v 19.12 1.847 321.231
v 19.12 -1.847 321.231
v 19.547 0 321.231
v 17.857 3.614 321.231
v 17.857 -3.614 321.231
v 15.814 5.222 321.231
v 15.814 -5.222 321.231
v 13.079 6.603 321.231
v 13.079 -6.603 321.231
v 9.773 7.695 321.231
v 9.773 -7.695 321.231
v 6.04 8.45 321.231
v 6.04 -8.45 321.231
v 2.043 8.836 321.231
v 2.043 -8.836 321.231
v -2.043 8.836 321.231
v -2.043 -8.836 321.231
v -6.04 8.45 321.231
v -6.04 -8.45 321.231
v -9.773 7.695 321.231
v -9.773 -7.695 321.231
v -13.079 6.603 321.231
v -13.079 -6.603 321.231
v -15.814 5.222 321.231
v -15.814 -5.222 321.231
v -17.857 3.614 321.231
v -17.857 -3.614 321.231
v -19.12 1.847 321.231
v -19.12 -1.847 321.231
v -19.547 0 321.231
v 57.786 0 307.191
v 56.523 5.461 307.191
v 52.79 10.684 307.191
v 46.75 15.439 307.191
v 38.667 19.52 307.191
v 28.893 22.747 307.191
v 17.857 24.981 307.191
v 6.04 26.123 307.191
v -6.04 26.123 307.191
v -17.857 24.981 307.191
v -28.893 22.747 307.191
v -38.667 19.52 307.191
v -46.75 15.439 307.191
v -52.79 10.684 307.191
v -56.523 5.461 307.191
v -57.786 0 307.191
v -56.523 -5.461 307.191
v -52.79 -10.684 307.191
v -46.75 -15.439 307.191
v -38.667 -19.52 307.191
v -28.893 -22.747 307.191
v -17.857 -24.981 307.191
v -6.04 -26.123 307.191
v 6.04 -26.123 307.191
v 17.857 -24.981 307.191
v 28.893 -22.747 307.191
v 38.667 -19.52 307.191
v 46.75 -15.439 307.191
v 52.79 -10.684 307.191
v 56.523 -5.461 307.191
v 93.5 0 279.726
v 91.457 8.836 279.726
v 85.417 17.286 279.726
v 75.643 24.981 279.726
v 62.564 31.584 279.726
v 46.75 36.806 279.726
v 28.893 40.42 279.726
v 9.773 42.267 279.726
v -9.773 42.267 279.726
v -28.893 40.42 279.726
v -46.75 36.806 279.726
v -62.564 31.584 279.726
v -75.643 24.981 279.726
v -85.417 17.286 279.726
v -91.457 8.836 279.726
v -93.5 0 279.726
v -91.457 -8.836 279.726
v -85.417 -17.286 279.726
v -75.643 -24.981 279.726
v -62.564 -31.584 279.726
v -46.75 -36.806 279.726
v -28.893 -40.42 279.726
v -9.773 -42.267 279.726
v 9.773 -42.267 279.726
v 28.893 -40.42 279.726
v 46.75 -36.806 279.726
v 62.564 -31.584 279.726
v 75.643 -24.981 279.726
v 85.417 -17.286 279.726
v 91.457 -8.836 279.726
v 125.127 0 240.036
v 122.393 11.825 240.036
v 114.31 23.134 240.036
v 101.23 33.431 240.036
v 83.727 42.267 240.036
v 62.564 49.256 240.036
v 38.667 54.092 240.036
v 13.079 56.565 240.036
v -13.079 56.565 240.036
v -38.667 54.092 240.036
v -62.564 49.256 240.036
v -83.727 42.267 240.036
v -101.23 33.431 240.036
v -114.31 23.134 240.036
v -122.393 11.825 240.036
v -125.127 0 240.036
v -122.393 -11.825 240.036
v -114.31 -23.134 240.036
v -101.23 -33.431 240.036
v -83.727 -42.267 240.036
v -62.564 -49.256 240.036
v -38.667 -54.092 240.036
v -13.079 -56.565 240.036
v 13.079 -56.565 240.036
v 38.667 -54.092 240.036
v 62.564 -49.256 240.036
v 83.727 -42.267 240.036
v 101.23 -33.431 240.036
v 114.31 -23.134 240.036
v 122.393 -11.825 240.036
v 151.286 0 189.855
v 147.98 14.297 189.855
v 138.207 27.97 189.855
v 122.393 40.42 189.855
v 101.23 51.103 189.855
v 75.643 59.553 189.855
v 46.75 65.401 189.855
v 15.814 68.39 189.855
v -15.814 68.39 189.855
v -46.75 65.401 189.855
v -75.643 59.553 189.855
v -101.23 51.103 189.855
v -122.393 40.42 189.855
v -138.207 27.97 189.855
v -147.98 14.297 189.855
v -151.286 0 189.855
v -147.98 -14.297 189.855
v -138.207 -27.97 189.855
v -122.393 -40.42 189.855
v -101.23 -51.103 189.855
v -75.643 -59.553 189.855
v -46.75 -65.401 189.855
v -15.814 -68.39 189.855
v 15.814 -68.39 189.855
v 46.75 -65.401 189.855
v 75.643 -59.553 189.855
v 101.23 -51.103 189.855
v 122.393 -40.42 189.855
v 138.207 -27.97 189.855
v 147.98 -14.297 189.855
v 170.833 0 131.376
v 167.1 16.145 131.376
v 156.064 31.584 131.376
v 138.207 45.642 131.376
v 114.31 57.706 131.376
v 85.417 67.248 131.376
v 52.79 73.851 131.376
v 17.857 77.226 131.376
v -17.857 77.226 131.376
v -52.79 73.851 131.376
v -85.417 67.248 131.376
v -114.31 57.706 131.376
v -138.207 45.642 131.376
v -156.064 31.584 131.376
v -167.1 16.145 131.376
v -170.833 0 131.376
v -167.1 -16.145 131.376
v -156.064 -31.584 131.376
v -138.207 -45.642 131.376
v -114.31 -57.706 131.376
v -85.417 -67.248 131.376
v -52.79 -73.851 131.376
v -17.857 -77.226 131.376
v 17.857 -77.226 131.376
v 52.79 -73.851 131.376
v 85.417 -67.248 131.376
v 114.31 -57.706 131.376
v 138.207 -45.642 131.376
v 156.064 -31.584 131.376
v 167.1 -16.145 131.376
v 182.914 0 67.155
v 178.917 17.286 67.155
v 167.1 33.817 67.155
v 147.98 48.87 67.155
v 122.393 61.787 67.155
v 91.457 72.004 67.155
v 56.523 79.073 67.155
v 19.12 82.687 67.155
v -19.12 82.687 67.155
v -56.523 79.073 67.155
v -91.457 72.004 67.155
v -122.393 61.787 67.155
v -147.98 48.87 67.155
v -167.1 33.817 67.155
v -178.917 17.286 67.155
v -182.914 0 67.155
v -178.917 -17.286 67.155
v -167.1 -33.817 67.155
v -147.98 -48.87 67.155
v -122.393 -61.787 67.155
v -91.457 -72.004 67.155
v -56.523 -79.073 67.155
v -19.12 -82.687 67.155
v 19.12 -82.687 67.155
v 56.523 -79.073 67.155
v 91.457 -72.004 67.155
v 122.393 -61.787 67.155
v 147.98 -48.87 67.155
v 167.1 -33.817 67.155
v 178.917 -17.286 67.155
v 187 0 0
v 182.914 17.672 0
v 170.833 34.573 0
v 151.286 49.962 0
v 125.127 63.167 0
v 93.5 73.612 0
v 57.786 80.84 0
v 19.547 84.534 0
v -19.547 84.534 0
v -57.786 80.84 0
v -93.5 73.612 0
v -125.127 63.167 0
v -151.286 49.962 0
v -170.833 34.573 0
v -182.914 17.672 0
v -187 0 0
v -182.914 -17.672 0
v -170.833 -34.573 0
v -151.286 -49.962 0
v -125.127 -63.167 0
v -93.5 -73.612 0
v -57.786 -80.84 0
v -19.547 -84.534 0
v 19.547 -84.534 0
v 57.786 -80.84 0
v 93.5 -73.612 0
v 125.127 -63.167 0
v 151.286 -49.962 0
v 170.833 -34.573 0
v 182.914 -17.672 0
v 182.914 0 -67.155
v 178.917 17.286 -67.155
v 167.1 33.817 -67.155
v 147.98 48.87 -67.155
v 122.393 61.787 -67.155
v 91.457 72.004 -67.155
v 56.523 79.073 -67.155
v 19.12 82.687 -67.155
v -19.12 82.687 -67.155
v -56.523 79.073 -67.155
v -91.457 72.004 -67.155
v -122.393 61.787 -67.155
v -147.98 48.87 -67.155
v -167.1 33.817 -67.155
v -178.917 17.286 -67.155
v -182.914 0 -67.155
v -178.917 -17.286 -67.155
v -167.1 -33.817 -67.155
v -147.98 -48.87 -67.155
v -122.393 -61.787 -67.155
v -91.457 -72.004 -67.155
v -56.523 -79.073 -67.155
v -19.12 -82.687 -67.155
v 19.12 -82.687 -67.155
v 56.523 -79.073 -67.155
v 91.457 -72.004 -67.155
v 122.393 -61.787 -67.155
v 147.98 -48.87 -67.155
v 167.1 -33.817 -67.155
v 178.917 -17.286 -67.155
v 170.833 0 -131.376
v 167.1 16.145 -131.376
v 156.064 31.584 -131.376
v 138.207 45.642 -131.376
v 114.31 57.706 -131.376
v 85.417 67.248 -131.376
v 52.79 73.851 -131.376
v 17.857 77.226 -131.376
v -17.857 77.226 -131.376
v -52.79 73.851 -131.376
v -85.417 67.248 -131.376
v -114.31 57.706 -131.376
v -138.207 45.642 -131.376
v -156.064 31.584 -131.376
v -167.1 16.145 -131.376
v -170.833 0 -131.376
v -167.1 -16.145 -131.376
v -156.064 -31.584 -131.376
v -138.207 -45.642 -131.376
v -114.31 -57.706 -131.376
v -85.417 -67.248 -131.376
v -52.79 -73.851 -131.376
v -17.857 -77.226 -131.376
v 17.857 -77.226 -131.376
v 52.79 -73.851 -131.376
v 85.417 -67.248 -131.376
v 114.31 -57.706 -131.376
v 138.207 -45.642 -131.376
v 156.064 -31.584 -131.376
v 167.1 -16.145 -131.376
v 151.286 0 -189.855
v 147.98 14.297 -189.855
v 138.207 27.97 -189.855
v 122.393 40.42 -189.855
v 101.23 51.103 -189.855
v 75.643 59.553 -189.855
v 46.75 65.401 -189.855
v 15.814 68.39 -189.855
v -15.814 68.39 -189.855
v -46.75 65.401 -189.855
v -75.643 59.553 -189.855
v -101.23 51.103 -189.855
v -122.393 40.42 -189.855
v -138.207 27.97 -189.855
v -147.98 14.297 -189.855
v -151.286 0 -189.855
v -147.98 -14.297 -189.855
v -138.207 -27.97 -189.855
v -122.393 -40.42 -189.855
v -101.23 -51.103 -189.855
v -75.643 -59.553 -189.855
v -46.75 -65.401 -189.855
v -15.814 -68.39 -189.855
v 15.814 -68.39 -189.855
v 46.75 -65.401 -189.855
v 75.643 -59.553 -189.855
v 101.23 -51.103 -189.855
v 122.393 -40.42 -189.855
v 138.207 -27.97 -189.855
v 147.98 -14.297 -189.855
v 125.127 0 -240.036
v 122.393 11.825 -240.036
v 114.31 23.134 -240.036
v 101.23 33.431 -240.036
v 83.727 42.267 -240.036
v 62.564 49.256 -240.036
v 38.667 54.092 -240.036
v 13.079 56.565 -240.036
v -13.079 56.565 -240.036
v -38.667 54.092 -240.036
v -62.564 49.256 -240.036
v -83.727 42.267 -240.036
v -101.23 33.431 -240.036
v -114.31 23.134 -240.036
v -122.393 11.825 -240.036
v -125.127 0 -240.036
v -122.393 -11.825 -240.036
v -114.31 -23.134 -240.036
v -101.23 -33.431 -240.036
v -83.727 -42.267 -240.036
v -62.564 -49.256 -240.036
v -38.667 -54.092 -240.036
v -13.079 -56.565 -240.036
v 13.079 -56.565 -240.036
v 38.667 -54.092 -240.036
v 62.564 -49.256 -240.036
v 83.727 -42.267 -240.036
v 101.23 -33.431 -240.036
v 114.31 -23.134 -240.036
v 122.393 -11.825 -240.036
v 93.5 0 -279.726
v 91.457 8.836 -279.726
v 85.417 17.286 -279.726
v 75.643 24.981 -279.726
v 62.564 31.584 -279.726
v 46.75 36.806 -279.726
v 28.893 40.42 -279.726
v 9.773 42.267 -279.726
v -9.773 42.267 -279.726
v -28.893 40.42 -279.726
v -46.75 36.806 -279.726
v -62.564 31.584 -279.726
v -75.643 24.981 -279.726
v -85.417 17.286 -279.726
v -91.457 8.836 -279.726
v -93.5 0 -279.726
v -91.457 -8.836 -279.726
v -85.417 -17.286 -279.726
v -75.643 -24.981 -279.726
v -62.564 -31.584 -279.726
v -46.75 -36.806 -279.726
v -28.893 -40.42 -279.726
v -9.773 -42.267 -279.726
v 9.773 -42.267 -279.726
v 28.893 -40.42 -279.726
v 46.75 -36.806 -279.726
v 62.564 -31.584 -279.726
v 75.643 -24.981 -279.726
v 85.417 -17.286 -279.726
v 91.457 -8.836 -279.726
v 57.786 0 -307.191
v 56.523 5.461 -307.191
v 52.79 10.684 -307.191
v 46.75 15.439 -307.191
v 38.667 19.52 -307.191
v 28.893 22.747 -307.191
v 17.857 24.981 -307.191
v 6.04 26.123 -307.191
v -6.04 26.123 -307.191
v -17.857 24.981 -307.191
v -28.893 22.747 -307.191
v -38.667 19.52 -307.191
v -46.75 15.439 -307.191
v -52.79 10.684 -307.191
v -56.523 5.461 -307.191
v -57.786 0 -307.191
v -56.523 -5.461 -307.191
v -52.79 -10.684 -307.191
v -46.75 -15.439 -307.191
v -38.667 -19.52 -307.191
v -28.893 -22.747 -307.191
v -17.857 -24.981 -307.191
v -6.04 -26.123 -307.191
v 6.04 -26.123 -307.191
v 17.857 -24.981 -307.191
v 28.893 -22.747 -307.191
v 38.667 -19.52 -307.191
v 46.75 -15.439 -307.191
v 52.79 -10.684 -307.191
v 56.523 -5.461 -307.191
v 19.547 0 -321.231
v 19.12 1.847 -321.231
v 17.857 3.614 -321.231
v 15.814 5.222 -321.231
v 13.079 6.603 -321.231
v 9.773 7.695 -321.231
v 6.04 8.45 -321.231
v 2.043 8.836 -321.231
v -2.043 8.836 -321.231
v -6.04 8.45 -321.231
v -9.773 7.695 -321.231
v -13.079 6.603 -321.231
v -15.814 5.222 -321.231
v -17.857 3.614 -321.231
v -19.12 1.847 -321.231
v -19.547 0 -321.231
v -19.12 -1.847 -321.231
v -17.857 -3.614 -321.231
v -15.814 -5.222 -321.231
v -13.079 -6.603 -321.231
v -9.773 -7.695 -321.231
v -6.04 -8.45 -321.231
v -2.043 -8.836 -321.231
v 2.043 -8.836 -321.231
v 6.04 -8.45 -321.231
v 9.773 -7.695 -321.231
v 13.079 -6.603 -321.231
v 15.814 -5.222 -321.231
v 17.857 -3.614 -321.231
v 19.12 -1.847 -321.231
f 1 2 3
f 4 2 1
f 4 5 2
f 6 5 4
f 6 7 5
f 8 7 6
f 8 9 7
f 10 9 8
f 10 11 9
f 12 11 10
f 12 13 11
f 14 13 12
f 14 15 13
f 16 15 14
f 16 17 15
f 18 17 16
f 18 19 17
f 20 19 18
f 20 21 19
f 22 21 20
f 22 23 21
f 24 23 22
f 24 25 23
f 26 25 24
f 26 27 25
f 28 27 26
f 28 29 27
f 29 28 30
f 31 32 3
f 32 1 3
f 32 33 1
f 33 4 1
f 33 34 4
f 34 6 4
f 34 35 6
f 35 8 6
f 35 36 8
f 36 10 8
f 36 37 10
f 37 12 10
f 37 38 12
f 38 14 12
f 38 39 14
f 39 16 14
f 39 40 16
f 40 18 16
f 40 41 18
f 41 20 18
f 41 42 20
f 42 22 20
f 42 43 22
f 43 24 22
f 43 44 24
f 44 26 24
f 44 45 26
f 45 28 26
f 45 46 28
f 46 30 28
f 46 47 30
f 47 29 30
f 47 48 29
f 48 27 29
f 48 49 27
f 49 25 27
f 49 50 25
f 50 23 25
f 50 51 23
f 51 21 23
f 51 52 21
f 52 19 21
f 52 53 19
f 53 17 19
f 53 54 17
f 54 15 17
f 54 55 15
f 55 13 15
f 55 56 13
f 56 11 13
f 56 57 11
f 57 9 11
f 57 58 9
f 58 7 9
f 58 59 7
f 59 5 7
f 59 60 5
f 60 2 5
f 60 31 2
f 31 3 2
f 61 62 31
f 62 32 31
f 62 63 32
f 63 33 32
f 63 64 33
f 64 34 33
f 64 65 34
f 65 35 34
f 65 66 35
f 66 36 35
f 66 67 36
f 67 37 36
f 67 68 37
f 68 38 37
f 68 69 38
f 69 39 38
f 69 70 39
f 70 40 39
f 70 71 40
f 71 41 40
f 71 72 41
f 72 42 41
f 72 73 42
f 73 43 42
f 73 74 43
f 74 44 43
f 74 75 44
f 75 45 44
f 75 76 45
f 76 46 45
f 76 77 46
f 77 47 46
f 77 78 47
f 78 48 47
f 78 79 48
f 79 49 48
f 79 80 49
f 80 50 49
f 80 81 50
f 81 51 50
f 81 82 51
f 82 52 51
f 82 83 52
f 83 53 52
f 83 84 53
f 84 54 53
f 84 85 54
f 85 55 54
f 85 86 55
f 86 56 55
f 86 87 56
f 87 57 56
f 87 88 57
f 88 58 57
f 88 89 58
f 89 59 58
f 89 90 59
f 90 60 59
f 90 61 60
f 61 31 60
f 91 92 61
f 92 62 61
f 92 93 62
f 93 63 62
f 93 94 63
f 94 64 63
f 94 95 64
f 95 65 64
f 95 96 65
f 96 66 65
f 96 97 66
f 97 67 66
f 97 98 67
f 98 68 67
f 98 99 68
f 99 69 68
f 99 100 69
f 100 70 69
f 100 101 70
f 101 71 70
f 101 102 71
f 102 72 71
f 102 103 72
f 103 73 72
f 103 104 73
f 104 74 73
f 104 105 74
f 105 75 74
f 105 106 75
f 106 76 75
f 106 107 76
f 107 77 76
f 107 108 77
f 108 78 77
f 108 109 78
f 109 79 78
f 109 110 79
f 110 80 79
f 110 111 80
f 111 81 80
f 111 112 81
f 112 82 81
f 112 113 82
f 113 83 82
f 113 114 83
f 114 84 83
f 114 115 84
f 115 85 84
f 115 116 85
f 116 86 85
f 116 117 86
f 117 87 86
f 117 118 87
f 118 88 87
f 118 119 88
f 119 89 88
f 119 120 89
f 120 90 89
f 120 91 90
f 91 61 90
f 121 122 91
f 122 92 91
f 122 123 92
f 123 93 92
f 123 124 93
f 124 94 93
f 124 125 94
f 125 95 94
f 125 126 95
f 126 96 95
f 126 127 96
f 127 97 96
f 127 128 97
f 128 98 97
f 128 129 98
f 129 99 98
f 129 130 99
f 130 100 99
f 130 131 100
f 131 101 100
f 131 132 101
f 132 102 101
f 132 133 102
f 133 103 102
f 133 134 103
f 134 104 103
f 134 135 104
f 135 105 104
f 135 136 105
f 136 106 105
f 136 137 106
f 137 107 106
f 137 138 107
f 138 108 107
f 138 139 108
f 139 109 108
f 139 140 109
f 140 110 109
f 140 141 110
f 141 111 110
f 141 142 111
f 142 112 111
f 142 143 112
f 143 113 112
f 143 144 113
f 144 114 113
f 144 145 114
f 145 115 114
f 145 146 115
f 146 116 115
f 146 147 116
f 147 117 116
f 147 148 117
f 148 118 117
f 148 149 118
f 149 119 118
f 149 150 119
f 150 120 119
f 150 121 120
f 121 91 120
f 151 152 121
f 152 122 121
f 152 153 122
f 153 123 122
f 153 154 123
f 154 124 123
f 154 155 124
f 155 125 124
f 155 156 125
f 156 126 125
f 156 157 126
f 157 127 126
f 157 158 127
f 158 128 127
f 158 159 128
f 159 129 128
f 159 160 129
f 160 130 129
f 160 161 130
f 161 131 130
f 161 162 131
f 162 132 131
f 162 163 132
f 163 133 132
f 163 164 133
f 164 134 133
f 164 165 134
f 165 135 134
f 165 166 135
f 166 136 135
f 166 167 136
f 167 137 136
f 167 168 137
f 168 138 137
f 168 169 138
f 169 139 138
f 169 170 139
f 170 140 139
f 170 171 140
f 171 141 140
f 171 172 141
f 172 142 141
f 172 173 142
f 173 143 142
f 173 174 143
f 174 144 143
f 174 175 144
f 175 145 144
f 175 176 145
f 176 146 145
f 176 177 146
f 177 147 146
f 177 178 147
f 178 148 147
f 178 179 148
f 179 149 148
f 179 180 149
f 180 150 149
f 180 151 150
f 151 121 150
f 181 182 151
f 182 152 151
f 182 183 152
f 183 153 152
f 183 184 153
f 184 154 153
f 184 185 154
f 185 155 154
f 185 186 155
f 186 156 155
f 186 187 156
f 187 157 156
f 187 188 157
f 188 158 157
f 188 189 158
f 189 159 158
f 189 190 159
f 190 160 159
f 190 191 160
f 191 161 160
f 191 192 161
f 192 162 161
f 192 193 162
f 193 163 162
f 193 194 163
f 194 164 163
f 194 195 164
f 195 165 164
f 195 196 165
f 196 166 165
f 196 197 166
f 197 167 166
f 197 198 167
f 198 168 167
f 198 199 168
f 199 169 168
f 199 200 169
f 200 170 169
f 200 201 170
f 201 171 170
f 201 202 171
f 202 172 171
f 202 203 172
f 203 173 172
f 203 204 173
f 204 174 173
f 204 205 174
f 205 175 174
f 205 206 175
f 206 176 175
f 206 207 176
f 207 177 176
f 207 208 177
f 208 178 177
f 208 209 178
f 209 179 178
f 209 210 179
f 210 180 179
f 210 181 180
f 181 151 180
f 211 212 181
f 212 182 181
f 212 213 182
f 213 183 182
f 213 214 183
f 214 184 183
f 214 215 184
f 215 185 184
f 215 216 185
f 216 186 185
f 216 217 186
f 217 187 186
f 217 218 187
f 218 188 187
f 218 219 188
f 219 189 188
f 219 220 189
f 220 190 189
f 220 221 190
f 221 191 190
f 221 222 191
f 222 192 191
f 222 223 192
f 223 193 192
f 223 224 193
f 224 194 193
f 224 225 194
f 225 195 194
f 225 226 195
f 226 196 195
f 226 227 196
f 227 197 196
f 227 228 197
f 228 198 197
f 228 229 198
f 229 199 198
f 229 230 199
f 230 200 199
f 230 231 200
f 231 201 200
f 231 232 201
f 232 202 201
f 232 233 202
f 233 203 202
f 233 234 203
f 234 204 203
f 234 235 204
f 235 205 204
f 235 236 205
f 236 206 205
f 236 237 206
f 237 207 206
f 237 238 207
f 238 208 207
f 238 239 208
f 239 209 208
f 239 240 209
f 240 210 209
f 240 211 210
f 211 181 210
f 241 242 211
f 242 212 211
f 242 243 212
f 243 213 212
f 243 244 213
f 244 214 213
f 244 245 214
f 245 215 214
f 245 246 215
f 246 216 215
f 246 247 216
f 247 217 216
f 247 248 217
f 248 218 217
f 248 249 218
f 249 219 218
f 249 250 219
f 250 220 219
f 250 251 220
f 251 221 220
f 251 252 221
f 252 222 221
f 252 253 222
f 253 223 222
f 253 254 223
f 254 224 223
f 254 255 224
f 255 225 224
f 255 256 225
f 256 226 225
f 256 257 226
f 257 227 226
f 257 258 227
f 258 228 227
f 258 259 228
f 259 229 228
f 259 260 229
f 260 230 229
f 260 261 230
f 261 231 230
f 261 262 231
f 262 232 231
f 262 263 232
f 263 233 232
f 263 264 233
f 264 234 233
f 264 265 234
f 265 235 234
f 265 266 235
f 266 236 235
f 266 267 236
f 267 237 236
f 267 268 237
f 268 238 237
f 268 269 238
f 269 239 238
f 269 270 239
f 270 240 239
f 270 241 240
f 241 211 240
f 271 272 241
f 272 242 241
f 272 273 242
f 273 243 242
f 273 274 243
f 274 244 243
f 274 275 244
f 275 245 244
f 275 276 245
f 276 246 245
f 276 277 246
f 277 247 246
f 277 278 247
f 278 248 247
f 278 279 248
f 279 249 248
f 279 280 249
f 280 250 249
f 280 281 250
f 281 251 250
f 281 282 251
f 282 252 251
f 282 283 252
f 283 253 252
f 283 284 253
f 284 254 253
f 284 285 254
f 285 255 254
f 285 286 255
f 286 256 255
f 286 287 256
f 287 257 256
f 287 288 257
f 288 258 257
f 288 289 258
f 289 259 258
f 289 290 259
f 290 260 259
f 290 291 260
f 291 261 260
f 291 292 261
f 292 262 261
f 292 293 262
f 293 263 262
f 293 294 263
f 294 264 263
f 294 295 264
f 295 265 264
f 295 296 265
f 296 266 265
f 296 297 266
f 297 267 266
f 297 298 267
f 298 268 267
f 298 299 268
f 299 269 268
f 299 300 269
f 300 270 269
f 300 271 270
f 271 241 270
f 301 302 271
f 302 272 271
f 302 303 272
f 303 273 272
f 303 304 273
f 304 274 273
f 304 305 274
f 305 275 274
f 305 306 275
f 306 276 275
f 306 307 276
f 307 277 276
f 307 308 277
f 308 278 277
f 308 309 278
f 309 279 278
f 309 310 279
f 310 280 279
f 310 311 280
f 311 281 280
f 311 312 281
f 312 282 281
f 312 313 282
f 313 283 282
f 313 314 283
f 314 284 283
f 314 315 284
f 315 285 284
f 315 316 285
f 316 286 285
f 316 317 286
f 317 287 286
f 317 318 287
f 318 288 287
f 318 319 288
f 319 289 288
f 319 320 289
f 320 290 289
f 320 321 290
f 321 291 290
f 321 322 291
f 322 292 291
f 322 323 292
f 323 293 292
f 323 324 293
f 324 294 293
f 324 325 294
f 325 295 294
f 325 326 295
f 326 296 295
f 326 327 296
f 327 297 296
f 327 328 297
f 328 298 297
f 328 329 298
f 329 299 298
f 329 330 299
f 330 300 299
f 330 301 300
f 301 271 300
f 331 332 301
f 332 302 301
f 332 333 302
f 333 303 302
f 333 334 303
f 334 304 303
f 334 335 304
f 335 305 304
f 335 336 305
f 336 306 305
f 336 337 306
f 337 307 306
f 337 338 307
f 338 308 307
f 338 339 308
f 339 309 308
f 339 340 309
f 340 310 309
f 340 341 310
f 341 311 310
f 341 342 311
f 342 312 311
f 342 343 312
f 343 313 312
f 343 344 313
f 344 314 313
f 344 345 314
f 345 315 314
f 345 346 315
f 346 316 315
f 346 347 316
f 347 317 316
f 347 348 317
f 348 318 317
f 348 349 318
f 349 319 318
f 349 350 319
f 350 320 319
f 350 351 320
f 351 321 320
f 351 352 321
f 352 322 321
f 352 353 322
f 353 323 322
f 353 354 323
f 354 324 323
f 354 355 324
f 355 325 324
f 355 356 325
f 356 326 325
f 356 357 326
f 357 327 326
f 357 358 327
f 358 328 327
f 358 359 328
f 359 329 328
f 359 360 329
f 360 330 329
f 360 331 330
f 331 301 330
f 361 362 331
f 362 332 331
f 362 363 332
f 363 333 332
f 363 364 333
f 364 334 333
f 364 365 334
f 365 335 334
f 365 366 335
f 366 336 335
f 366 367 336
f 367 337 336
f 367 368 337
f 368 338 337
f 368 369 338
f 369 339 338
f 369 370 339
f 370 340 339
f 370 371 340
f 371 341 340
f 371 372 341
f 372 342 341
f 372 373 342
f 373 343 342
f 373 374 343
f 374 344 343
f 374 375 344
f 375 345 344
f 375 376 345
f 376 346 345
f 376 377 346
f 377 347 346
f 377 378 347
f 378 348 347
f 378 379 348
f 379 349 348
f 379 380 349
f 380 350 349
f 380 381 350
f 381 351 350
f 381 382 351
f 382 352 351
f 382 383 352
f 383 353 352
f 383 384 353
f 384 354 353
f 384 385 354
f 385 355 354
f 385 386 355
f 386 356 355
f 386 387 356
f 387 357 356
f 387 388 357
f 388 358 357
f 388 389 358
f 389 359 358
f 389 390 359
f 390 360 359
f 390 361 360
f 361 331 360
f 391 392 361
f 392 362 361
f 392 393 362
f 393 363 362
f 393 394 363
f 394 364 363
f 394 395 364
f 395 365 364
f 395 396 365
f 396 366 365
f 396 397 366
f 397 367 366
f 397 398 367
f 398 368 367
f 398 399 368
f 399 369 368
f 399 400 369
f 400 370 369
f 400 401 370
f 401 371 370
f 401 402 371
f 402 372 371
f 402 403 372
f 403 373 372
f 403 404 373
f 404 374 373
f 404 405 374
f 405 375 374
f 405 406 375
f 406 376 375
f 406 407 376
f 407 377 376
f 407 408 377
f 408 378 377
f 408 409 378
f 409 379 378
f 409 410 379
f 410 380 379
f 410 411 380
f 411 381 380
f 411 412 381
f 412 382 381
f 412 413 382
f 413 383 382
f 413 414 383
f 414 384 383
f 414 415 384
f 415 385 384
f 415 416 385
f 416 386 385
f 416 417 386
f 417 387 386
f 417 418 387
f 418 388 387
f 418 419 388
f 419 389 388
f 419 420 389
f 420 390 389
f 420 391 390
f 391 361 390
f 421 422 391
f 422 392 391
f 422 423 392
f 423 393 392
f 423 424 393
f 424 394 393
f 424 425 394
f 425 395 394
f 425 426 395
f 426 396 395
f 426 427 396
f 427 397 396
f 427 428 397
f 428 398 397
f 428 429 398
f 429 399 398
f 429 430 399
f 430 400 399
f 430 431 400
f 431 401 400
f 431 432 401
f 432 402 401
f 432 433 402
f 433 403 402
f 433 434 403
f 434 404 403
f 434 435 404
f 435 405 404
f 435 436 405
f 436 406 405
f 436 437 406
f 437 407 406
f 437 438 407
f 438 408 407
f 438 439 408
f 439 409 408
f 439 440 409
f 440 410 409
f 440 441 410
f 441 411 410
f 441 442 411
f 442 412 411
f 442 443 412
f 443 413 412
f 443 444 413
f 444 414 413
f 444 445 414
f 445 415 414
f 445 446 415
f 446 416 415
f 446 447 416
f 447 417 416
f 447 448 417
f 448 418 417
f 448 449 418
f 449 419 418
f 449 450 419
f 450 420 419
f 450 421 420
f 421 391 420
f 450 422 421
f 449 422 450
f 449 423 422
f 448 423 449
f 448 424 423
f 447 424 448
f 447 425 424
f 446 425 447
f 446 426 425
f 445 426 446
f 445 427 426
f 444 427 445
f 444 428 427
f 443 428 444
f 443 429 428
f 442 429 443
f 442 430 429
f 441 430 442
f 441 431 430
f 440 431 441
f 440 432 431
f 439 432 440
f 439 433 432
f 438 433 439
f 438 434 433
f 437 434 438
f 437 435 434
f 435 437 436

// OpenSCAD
// Generated by SolidPython 1.0.1 on 2020-07-29 00:46:49


scale(v = [11, 5, 19]) {
	sphere(r = 17);
}
/***********************************************
*********      SolidPython code:      **********
************************************************
 
# import packages: SolidPython
from solid import *
from solid.utils import *
from itertools import chain, combinations, permutations


class Resize:

    def __init__(self, scad_file):
        self.scad_file = scad_file
        #self.scad_file = import_scad(scad_file)
        # cone/cylinder param:
        self.r1 = 0
        self.r2 = 0
        self.h = 0
        # rectangular prism param:
        self.w = 0
        self.l = 0
        # ellipse param:
        self.r = 0

    # import OpenScad code (file name corresponds to shape)


    # classify shape + parameters
    def assign(self, param1, param2, param3):
        if self.scad_file == 'cone.scad':
            self.r1 = param1
            self.r2 = param2
            self.h = param3
        elif self.scad_file == 'cylinder.scad':
            self.r1 = param1
            self.r2 = param2
            self.h = param3
        elif self.scad_file == 'rectangularPrism.scad':
            self.h = param1
            self.l = param2
            self.w = param3
        else:
            self.r = param1
            self.h = param2

    # resize parameters
    def iterate(self):
        x = range(3, 20, 2)
        i = 1
        if self.scad_file == 'cone.scad':
            tempList = list(permutations(x, 2))
            for temp in tempList:
                param1 = temp[0]
                param2 = temp[1]
                filepath = 'produced_scad_files/' + 'cone' + str(param1) + '_' + str(param2) + '_' + '.scad'
                scad_render_to_file(cylinder(h=param1, r1=param2, r2=0), filepath)

        elif self.scad_file == 'cylinder.scad':
            tempList = list(permutations(x, 3))
            for temp in tempList:
                param1 = temp[0]
                param2 = temp[1]
                filepath = 'produced_scad_files/' + 'cylinder' + str(param1) + '_' + str(param2) + '_' + '.scad'
                scad_render_to_file(cylinder(h=param1, r1=param2, r2=param2), filepath)

        elif self.scad_file == 'rectangularPrism.scad':
            tempList = list(permutations(x, 3))
            for temp in tempList:
                param1 = temp[0]
                param2 = temp[1]
                param3 = temp[2]
                filepath = 'produced_scad_files/' + 'rectangularPrism' + str(param1) + '_' + str(param2) + '_' + str(
                    param3) + '.scad'
                scad_render_to_file(cube(size=(param1, param2, param3)), filepath)

        elif self.scad_file == 'ellipse.scad':
            tempList = list(permutations(x, 4))
            for temp in tempList:
                param1 = temp[0]
                param2 = temp[1]
                param3 = temp[2]
                param4 = temp[3]
                filepath = 'produced_scad_files/' + 'ellipse' + str(param1) + '_' + str(param2) + '_' + str(param3) + '_' + str(param4) + '.scad'
                scad_render_to_file(scale([param1, param2, param3])(sphere(r=param4)), filepath)

    def render_to_scadfile(self):
        scad_render_to_file(scad, 'example.scad') 
 
************************************************/
